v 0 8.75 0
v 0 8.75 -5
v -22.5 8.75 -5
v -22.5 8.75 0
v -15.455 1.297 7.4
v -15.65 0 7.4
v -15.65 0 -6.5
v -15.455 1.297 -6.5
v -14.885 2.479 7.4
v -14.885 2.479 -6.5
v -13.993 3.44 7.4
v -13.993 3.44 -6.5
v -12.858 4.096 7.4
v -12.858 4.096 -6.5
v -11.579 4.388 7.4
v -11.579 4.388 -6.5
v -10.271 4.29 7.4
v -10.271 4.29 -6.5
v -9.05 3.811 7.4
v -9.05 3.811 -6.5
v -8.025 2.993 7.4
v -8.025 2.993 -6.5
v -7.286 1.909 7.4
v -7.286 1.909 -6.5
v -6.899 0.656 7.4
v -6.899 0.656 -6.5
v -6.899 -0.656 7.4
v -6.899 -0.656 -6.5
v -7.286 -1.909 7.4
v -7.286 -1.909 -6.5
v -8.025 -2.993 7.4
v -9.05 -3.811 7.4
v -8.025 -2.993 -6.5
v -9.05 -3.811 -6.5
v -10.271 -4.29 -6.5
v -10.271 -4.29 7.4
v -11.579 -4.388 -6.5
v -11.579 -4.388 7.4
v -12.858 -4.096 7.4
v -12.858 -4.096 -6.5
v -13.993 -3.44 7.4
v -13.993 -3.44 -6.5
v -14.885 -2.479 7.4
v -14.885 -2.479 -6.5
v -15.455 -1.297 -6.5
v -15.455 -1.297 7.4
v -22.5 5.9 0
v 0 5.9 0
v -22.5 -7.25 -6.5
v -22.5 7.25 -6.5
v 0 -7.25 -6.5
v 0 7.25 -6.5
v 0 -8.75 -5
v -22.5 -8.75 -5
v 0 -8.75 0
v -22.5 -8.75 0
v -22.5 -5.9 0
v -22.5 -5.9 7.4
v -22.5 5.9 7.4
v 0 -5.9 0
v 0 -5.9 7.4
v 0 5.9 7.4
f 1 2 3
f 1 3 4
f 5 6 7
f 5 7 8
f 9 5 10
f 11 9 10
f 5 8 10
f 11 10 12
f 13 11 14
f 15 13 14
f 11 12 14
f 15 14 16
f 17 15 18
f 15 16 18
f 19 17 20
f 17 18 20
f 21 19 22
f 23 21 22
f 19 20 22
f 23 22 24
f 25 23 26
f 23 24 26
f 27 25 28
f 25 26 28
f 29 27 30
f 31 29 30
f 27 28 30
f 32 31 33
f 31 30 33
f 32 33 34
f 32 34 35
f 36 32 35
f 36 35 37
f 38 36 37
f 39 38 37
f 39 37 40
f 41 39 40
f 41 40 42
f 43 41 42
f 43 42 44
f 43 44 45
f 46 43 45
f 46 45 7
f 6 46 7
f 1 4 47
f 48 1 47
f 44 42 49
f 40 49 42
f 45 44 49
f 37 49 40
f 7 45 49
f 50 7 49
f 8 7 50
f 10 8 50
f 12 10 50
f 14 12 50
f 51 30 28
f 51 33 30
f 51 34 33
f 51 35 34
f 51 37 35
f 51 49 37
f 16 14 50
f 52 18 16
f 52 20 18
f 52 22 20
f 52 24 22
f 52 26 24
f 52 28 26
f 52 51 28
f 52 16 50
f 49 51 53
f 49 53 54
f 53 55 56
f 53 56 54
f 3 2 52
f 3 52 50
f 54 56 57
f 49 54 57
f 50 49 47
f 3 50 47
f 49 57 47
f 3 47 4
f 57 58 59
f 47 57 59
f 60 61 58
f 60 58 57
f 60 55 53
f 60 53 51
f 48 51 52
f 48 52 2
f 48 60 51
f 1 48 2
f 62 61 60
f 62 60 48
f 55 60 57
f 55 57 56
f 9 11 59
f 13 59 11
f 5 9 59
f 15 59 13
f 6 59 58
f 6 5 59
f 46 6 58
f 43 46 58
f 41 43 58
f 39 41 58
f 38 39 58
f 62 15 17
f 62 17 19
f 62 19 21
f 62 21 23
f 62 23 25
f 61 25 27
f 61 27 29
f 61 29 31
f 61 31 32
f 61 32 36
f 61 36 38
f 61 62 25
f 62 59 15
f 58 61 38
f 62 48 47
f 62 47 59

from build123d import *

# Parameters (mm, degrees)
F1_DEPTH = 22.5
F3_D     = 8.8
F4_SIZE  = 1.5


with BuildPart() as f1:
    # F0 (on Right) → F1 (new body)
    with BuildSketch(Plane.YZ):
        Polygon((5.9, 7.4), (-5.9, 7.4), (-5.9, 0), (-8.75, 0), (-8.75, -6.5), (8.75, -6.5), (8.75, 0), (5.9, 0), align=None)
    extrude(amount=-F1_DEPTH)

    # F3 (through all)
    with Locations(Plane.XY.offset(7.4)):
        with Locations((-11.25, 0)):
            Hole(F3_D / 2)

    # F4
    f4_edges = [f1.edges().sort_by_distance(p)[0] for p in [
        (-11.25, -8.75, -6.5),
        (-11.25, 8.75, -6.5),
    ]]
    chamfer(f4_edges, length=F4_SIZE)


solid = f1.part
